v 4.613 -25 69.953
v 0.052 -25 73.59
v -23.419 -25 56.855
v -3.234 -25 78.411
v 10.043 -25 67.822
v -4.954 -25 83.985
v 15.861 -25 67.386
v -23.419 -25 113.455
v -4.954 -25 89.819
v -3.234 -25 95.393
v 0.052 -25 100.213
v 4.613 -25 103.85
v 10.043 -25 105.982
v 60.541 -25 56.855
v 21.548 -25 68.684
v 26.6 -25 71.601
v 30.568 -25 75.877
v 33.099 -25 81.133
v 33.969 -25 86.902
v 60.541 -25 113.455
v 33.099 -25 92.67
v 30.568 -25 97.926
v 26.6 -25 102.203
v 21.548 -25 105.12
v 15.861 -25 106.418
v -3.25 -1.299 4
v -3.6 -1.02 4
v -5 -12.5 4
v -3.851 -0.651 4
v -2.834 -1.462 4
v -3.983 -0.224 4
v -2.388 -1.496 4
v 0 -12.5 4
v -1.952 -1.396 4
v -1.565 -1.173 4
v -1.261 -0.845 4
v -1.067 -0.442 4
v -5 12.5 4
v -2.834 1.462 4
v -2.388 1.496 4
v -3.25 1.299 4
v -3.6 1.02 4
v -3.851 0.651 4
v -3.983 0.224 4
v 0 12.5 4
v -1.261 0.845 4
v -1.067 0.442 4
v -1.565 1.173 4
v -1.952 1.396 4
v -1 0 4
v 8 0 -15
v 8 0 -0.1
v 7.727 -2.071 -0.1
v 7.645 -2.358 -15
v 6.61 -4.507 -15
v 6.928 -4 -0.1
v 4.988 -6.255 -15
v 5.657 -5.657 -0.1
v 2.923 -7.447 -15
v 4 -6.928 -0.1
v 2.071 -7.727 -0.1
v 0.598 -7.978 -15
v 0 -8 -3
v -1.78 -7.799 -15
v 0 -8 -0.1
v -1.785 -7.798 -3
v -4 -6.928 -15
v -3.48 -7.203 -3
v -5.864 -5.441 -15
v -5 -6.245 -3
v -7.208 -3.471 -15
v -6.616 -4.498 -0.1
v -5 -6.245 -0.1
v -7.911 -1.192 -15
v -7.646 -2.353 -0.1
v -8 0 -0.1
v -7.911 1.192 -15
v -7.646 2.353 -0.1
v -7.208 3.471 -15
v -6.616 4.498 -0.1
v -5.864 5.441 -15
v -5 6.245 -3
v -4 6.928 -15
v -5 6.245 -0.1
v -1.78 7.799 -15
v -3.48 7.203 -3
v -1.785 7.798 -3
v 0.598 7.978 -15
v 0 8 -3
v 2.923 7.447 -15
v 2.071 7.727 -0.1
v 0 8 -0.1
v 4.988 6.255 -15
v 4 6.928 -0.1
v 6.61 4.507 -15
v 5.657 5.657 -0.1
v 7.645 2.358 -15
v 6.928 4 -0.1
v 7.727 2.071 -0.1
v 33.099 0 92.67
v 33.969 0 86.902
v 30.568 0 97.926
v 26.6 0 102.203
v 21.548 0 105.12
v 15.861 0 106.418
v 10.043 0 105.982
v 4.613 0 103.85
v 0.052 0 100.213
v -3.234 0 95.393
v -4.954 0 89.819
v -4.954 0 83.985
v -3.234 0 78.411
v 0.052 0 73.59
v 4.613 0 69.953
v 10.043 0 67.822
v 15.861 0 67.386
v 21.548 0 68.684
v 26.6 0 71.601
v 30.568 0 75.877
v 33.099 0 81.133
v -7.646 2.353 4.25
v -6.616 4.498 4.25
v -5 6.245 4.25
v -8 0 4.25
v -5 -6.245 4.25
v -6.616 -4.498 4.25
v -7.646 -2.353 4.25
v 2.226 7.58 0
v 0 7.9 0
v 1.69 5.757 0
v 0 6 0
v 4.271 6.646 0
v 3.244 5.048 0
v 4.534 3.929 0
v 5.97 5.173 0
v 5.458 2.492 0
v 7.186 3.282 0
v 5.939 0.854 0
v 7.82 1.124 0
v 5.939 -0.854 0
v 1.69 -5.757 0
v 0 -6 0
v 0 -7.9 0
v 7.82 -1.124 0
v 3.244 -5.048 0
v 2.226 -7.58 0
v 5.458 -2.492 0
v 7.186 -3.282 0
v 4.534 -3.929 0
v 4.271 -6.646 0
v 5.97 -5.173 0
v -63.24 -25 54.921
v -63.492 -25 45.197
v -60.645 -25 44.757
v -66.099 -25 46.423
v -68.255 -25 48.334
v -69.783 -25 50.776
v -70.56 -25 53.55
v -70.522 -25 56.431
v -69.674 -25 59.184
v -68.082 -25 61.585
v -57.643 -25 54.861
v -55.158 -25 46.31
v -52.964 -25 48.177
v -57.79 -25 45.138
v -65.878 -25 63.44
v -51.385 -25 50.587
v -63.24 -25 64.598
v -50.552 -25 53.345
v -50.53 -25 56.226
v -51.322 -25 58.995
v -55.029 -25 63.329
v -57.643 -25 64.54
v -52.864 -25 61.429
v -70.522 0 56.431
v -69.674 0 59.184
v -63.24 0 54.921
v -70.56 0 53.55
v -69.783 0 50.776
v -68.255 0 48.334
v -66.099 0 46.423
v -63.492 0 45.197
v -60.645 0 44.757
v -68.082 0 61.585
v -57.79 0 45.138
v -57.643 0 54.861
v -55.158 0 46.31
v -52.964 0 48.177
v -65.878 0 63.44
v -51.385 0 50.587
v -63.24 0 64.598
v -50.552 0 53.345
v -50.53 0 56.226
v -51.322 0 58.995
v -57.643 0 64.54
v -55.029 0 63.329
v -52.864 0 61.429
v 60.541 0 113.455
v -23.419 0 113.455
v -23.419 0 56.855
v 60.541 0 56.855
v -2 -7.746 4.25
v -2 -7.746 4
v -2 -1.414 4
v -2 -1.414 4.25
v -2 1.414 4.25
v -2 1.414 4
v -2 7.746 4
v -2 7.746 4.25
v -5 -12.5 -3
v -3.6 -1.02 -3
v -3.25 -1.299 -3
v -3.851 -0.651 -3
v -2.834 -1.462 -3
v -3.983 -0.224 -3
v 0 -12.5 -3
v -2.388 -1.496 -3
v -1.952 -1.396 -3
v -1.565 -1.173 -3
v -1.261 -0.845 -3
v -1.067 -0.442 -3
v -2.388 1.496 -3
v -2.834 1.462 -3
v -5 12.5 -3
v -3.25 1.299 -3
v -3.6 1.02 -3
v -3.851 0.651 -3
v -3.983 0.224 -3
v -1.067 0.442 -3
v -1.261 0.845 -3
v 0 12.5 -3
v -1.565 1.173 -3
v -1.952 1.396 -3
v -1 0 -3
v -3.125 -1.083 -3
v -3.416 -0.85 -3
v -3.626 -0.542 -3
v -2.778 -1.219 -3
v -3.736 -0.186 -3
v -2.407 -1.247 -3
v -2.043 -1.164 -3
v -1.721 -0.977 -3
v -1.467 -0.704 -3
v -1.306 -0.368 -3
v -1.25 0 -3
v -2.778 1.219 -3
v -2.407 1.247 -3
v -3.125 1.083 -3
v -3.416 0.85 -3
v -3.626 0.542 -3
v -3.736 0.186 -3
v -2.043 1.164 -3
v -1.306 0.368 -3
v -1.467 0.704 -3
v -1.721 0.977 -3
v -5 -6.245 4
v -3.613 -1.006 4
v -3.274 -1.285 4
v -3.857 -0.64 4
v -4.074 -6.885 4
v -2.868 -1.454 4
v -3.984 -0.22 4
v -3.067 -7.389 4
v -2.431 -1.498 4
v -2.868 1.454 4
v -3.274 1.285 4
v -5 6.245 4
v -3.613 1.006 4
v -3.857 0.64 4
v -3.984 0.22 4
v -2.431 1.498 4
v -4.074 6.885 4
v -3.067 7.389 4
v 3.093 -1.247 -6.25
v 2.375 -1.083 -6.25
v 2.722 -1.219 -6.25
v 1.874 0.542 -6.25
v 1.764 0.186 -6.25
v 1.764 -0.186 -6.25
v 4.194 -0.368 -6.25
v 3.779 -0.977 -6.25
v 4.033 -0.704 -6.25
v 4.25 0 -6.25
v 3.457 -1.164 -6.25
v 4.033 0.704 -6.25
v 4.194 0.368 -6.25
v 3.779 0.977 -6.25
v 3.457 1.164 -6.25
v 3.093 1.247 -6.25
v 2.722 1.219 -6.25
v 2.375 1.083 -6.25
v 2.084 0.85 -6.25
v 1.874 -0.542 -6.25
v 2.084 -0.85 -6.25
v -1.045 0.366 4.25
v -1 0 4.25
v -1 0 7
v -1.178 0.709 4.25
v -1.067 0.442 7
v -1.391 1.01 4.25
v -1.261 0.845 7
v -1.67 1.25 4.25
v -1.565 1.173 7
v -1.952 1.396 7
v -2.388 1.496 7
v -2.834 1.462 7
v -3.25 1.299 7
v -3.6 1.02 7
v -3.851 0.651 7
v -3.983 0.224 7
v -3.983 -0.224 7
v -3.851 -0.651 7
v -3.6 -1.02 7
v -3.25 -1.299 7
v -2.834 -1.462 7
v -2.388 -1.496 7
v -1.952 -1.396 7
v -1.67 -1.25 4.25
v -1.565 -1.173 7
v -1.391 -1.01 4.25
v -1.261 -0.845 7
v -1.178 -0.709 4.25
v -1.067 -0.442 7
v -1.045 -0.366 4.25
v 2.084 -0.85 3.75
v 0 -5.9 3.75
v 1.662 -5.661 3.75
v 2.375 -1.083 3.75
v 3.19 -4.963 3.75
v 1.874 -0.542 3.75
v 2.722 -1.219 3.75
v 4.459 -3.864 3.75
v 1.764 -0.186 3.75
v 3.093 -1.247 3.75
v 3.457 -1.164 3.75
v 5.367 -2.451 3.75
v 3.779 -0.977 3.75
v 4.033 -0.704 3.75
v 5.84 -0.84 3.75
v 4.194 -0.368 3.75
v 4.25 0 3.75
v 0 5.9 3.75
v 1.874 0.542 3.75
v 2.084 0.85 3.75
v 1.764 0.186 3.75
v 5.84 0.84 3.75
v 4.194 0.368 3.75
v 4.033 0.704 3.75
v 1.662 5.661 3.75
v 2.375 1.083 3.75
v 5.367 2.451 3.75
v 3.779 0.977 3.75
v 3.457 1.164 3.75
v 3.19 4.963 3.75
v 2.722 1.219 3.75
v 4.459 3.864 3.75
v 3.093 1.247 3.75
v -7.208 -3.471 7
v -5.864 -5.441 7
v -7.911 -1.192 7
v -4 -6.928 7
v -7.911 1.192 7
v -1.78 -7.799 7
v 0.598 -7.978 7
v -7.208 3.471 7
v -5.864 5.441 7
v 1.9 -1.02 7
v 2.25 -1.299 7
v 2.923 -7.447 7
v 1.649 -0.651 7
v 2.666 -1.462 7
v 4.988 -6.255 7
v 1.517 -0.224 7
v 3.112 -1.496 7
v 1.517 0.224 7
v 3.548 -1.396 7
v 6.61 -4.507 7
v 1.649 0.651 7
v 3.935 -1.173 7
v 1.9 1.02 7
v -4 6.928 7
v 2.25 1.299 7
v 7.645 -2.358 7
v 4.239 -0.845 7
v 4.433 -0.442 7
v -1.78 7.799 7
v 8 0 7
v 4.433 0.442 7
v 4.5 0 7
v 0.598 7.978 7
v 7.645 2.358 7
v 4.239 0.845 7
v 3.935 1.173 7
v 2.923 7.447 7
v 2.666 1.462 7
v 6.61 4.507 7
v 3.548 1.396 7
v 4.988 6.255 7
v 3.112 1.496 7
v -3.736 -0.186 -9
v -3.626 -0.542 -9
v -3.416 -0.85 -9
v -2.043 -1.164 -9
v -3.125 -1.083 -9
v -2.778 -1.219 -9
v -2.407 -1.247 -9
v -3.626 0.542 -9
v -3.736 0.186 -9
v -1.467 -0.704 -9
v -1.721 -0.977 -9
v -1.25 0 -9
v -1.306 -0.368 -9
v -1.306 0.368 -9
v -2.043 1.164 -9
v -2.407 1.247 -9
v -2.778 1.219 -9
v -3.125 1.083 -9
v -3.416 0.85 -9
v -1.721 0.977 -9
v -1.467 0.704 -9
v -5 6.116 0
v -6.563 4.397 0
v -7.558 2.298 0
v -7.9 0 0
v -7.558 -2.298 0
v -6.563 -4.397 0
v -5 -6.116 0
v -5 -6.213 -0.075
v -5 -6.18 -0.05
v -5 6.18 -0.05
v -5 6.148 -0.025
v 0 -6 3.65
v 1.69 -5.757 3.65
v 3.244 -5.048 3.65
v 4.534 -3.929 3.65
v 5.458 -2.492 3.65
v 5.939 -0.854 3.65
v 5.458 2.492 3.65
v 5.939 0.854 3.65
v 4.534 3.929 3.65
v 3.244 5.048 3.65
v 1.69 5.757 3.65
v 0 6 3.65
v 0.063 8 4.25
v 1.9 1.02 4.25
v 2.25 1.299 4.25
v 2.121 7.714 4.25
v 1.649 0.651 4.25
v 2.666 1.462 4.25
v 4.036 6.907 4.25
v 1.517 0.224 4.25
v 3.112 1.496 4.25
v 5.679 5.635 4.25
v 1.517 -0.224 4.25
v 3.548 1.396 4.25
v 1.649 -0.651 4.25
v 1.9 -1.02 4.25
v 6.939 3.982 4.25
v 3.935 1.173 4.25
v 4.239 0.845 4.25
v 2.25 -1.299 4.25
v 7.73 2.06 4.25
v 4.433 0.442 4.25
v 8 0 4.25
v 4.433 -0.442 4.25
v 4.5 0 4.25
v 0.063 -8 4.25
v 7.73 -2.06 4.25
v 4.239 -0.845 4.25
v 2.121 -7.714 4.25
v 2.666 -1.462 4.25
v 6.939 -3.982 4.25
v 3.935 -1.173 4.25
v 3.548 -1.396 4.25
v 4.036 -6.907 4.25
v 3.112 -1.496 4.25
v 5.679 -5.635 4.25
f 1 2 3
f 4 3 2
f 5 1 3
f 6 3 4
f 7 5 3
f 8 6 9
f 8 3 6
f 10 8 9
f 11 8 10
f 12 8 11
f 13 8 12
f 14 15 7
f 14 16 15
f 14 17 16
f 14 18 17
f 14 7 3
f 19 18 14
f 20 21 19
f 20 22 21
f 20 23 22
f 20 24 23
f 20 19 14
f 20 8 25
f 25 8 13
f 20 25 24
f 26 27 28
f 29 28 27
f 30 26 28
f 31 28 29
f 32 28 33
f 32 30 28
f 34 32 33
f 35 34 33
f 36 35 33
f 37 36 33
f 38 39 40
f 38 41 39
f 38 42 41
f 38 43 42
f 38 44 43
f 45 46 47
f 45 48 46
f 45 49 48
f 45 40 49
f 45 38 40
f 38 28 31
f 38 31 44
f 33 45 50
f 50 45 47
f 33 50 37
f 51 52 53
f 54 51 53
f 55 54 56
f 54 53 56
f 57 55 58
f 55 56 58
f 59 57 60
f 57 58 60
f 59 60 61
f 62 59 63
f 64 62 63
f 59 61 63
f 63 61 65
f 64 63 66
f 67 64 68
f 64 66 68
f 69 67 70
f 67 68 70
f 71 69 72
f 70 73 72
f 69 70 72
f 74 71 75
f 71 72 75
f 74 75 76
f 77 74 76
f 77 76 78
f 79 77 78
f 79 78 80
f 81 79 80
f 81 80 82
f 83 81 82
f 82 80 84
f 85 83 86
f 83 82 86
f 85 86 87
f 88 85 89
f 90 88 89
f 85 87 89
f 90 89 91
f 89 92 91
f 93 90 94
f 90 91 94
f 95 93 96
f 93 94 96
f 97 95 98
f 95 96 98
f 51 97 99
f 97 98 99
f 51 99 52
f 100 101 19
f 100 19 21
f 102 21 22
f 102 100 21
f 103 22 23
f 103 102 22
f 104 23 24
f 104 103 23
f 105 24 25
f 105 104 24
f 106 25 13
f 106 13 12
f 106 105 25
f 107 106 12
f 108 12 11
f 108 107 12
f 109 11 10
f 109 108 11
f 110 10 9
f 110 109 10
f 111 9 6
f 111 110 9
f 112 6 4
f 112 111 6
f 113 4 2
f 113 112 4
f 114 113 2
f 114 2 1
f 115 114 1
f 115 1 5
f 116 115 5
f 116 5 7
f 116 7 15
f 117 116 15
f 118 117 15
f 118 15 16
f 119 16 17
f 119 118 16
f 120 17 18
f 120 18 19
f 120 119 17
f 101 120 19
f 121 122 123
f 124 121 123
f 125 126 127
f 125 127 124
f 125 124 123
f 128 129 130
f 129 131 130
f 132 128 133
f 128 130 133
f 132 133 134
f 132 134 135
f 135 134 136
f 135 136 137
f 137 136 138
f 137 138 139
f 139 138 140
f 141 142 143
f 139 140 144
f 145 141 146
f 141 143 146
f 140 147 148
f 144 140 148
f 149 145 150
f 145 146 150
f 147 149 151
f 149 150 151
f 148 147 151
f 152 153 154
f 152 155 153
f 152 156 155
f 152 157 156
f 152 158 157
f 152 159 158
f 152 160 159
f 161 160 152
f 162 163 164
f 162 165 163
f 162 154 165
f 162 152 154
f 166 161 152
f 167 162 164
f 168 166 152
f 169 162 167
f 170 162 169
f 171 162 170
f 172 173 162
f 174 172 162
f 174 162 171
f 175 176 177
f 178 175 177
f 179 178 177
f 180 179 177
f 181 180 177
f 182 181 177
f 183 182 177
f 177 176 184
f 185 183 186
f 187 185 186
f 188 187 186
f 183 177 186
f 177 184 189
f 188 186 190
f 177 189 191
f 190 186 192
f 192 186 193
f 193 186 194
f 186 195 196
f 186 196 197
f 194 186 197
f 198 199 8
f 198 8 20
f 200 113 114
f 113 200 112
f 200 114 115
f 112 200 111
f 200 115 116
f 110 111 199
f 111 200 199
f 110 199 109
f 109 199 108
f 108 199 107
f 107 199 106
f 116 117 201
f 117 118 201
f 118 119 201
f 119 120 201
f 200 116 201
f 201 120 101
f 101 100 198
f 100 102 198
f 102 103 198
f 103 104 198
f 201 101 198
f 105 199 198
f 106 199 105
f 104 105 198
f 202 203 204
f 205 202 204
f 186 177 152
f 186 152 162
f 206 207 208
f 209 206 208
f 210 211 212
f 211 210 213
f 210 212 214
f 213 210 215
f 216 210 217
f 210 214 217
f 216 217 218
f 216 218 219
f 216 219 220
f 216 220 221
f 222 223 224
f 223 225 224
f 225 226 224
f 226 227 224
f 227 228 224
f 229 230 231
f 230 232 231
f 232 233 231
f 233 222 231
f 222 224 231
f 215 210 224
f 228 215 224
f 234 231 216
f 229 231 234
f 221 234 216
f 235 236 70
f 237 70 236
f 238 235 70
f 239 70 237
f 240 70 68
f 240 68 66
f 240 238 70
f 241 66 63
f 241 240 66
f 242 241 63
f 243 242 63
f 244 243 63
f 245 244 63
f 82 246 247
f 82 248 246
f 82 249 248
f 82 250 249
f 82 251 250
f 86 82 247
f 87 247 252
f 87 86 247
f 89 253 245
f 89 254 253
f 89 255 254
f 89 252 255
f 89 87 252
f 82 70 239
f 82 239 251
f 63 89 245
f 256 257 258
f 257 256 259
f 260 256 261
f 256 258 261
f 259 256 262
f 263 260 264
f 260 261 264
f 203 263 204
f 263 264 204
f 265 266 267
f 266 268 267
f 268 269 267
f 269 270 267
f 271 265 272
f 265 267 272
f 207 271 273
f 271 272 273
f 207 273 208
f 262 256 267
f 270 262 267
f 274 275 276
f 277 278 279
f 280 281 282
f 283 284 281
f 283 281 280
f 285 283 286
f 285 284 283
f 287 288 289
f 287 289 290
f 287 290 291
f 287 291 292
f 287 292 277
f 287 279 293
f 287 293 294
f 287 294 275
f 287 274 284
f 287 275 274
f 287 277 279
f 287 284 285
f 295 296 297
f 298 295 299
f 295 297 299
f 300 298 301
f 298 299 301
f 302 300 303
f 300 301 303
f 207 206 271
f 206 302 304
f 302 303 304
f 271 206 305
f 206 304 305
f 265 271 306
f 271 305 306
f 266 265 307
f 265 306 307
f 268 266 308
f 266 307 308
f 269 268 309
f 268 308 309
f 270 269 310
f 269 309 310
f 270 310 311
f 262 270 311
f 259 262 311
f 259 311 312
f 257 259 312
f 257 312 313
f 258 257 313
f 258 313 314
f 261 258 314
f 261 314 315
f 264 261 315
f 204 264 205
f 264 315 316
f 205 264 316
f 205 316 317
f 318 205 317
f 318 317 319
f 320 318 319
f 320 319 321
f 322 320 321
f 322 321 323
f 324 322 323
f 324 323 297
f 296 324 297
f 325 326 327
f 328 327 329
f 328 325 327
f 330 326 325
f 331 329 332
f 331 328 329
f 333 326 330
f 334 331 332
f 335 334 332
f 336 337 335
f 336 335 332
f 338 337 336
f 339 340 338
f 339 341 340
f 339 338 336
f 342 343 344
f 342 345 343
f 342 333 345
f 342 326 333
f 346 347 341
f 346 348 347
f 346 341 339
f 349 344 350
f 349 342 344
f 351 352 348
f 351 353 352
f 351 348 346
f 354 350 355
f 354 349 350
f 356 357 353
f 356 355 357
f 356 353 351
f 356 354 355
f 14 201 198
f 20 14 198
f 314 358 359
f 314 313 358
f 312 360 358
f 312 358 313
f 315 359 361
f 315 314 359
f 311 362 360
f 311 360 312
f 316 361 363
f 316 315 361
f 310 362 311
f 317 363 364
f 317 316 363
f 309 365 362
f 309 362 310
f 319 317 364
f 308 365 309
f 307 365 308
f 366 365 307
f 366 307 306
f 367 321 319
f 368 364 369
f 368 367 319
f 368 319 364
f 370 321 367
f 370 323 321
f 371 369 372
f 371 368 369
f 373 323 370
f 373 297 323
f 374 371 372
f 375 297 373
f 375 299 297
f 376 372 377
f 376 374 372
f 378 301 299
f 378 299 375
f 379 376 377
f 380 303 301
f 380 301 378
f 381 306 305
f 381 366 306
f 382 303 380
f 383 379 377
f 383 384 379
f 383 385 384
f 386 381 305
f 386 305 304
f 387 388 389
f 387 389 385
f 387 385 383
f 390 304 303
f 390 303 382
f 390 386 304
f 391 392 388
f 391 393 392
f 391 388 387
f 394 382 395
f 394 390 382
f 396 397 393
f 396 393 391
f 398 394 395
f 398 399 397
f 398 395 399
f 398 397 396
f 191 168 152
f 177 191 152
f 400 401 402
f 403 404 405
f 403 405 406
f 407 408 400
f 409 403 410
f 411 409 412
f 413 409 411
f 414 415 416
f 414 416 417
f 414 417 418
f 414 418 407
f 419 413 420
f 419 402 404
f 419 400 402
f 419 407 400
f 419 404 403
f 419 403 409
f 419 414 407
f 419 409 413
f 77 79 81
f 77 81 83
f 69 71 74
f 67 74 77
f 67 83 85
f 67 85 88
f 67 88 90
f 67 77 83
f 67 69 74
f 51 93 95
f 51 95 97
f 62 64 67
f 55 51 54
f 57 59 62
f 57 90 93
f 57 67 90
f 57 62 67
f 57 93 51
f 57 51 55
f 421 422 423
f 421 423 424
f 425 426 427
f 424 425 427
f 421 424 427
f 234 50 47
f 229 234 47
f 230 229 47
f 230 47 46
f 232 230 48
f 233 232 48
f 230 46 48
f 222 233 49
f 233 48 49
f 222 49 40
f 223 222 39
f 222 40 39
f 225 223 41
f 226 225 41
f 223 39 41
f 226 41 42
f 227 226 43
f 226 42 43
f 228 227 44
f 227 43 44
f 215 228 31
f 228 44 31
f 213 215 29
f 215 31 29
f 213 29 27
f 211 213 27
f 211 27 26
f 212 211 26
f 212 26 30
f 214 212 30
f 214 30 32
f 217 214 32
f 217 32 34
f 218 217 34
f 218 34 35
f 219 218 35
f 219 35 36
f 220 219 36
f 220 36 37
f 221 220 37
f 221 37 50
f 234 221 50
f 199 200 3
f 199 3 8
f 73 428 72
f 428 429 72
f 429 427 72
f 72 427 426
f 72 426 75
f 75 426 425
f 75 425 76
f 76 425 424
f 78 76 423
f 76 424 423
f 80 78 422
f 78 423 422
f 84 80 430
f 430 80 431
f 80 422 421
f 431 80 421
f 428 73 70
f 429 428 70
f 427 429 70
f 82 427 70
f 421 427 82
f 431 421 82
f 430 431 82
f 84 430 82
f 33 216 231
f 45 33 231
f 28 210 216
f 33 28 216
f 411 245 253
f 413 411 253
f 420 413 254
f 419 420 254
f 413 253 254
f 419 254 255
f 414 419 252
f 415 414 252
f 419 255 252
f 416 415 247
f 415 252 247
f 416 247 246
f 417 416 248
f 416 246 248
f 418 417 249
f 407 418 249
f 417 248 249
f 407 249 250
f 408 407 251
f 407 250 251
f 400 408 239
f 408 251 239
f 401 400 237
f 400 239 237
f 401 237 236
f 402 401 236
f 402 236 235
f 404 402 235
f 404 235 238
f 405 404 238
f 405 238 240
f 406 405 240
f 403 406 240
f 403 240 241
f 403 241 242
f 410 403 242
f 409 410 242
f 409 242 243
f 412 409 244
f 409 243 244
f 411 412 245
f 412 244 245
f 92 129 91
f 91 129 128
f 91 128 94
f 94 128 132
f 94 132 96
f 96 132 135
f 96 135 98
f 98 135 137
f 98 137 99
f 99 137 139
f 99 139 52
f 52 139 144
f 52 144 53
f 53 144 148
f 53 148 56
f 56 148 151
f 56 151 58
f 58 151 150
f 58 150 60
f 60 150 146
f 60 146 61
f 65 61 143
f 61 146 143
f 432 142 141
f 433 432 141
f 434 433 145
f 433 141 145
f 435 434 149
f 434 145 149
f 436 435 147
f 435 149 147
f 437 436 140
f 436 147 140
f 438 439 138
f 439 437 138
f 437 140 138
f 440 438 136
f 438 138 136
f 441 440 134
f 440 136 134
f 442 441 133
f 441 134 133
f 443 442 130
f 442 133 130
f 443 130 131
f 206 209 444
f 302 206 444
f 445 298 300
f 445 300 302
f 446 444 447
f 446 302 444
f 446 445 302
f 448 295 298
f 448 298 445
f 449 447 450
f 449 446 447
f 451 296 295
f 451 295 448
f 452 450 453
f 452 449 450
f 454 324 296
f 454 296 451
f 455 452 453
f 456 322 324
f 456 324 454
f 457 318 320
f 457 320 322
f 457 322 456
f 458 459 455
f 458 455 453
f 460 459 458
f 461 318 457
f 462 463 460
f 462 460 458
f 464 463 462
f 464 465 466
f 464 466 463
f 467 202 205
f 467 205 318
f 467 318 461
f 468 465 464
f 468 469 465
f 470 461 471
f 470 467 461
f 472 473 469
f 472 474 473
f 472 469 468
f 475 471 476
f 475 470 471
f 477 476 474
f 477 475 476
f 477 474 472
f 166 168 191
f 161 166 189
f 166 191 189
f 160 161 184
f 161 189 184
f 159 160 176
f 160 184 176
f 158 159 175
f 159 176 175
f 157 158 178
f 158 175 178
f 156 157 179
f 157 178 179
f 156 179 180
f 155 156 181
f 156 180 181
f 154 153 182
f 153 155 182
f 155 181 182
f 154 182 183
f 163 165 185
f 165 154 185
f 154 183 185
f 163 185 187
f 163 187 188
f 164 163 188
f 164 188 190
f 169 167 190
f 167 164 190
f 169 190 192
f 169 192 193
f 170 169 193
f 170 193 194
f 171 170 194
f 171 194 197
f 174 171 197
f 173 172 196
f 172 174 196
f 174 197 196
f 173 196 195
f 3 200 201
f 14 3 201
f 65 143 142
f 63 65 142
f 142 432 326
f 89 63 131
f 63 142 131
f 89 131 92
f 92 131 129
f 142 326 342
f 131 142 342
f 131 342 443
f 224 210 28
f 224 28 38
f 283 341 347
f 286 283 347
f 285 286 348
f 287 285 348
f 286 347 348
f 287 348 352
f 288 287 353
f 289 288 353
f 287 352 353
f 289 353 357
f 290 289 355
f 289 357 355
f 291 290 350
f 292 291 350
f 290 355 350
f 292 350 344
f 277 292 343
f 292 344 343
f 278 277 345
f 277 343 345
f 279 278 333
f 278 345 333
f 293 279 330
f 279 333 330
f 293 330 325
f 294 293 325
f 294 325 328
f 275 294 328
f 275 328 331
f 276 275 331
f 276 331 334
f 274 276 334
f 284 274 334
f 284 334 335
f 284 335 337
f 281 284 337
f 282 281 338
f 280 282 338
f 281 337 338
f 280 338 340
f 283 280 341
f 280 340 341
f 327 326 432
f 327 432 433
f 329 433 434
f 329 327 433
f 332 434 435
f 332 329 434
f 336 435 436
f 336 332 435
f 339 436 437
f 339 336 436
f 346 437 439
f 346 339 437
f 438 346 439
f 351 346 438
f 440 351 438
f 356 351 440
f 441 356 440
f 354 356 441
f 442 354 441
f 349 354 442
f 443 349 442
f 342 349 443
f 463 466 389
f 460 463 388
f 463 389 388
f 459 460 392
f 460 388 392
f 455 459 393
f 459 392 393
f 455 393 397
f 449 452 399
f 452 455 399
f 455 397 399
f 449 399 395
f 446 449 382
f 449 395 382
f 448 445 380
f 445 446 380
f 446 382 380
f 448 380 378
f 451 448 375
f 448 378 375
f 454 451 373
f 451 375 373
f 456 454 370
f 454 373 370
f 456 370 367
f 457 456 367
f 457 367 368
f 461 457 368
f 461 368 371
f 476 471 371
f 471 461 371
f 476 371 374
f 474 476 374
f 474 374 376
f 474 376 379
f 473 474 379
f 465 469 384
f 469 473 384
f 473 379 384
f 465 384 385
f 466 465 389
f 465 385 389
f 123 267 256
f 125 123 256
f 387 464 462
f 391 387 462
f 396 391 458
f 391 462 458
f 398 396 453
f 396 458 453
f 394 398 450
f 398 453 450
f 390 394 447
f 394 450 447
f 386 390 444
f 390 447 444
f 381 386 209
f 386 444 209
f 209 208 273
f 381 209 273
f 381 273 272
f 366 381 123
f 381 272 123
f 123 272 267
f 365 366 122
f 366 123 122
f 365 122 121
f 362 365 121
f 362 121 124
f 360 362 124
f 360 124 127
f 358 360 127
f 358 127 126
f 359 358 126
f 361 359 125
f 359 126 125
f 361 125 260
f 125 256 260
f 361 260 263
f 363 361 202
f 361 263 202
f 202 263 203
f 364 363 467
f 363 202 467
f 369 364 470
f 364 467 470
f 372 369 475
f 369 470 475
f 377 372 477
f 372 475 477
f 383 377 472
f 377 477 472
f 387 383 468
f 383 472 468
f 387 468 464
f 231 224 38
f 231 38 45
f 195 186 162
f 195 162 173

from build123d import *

# Parameters (mm, degrees)
F0_R      = 6
F1_DEPTH  = 3.75
F2_R      = 8
F3_DEPTH  = 15
F4_SIZE   = 0.1
F6_DEPTH  = 3.75
F7_W      = 5
F7_H      = 25
F8_DEPTH  = 3
F9_W      = 5
F9_H      = 25
F10_DEPTH = 7
F11_R     = 8
F12_DEPTH = 3
F13_R     = 1.5
F14_DEPTH = 3
F15_R     = 1.5
F16_DEPTH = 10
F17_R     = 1.25
F18_DEPTH = 6
F19_R     = 1.25
F20_DEPTH = 10
F21_R     = 1.5
F22_DEPTH = 0.25
F23_R     = 10.1040032944
F24_DEPTH = 25
F25_W     = 83.9598011225
F25_H     = 56.6002205014
F25_R     = 19.5705951154
F26_DEPTH = 25
F28_DEPTH = 25


with BuildPart() as f1:
    # F0 (on Top) → F1 (new body)
    with BuildSketch(Plane.XY):
        Circle(F0_R)
    extrude(amount=F1_DEPTH)

    # F2 (on face) → F3 (join)
    with BuildSketch(Plane(origin=(0, 0, 0), x_dir=(1, 0, 0), z_dir=(0, 0, -1))):
        Circle(F2_R)
    extrude(amount=F3_DEPTH)

    # F4
    f4_edges = [f1.edges().sort_by_distance(p)[0] for p in [
        (-6, 0, 3.75),
        (-8, 0, 0),
    ]]
    chamfer(f4_edges, length=F4_SIZE)

    # F5 (on face) → F6 (cut, through all)
    with BuildSketch(Plane.XY.offset(3.75)):
        with BuildLine():
            Line((0, -6), (0, 6))
            ThreePointArc((0, 6), (-6, 0), (0, -6))
        make_face()
    extrude(amount=-F6_DEPTH, mode=Mode.SUBTRACT)

    # F7 (on face) → F8 (cut)
    with BuildSketch(Plane.XY):
        with Locations((-2.5, 0)):
            Rectangle(F7_W, F7_H)
    extrude(amount=-F8_DEPTH, mode=Mode.SUBTRACT)

    # F17 (on face) → F18 (cut)
    with BuildSketch(Plane.XY.offset(-3)):
        with Locations((-2.5, 0)):
            Circle(F17_R)
    extrude(amount=-F18_DEPTH, mode=Mode.SUBTRACT)

    # F19 (on face) → F20 (cut)
    with BuildSketch(Plane.XY.offset(3.75)):
        with Locations((3, 0)):
            Circle(F19_R)
    extrude(amount=-F20_DEPTH, mode=Mode.SUBTRACT)


with BuildPart() as f10:
    # F9 (on face) → F10 (new body)
    with BuildSketch(Plane.XY.offset(-3)):
        with Locations((-2.5, 0)):
            Rectangle(F9_W, F9_H)
    extrude(amount=F10_DEPTH)


with BuildPart() as f12:
    # F11 (on face) → F12 (new body)
    with BuildSketch(Plane.XY.offset(4)):
        Circle(F11_R)
    extrude(amount=F12_DEPTH)

    # F13 (on face) → F14 (cut, through all)
    with BuildSketch(Plane.XY.offset(7)):
        with Locations((3, 0)):
            Circle(F13_R)
    extrude(amount=-F14_DEPTH, mode=Mode.SUBTRACT)


with BuildPart() as f16_tool:
    # F15 (on face) → F16 (new body, through all)
    with BuildSketch(Plane.XY.offset(7)):
        with Locations((-2.5, 0)):
            Circle(F15_R)
    extrude(amount=-F16_DEPTH)


with BuildPart() as f10_1:
    add(f10.part)

    # F16: cut by f16_tool
    add(f16_tool.part, mode=Mode.SUBTRACT)


with BuildPart() as f12_1:
    add(f12.part)

    # F16: cut by f16_tool
    add(f16_tool.part, mode=Mode.SUBTRACT)

    # F21 (on face) → F22 (cut)
    with BuildSketch(Plane(origin=(0, 0, 4), x_dir=(1, 0, 0), z_dir=(0, 0, -1))):
        with BuildLine():
            Line((-2, -1.4142135624), (-2, -7.7459666924))
            ThreePointArc((-2, -7.7459666924), (4.8989794856, -6.3245553203), (8, 0))
            ThreePointArc((8, 0), (4.8989794856, 6.3245553203), (-2, 7.7459666924))
            Line((-2, 7.7459666924), (-2, 1.4142135624))
            ThreePointArc((-2, 1.4142135624), (-1.2752551286, 0.8660254038), (-1, 0))
            ThreePointArc((-1, 0), (-1.2752551286, -0.8660254038), (-2, -1.4142135624))
        make_face()
        with Locations((3, 0)):
            Circle(F21_R, mode=Mode.SUBTRACT)
        with BuildLine():
            ThreePointArc((-5, 6.2449979984), (-8, 0), (-5, -6.2449979984))
            Line((-5, -6.2449979984), (-5, 6.2449979984))
        make_face()
    extrude(amount=-F22_DEPTH, mode=Mode.SUBTRACT)


with BuildPart() as f24:
    # F23 (on Front) → F24 (new body)
    with BuildSketch(Plane.XZ):
        with Locations((-60.5412572622, 54.8605136573)):
            Circle(F23_R)
    extrude(amount=F24_DEPTH)

    # F27 (on face) → F28 (cut)
    with BuildSketch(Plane.XZ.offset(25)):
        with BuildLine():
            Line((-57.6432645321, 54.8605136573), (-57.6432645321, 64.5400033499))
            ThreePointArc((-57.6432645321, 64.5400033499), (-60.4374425407, 64.9639836096), (-63.2397426056, 64.5975080306))
            Line((-63.2397426056, 64.5975080306), (-63.2397426056, 54.920747813))
            Line((-63.2397426056, 54.920747813), (-57.6432645321, 54.8605136573))
        make_face()
    extrude(amount=-F28_DEPTH, mode=Mode.SUBTRACT)


with BuildPart() as f26:
    # F25 (on Front) → F26 (new body)
    with BuildSketch(Plane.XZ):
        with Locations((18.5613604262, 85.1547084749)):
            Rectangle(F25_W, F25_H)
        with Locations((14.3980616704, 86.9018658996)):
            Circle(F25_R, mode=Mode.SUBTRACT)
    extrude(amount=F26_DEPTH)


solid = Compound([f1.part, f10_1.part, f12_1.part, f24.part, f26.part])
